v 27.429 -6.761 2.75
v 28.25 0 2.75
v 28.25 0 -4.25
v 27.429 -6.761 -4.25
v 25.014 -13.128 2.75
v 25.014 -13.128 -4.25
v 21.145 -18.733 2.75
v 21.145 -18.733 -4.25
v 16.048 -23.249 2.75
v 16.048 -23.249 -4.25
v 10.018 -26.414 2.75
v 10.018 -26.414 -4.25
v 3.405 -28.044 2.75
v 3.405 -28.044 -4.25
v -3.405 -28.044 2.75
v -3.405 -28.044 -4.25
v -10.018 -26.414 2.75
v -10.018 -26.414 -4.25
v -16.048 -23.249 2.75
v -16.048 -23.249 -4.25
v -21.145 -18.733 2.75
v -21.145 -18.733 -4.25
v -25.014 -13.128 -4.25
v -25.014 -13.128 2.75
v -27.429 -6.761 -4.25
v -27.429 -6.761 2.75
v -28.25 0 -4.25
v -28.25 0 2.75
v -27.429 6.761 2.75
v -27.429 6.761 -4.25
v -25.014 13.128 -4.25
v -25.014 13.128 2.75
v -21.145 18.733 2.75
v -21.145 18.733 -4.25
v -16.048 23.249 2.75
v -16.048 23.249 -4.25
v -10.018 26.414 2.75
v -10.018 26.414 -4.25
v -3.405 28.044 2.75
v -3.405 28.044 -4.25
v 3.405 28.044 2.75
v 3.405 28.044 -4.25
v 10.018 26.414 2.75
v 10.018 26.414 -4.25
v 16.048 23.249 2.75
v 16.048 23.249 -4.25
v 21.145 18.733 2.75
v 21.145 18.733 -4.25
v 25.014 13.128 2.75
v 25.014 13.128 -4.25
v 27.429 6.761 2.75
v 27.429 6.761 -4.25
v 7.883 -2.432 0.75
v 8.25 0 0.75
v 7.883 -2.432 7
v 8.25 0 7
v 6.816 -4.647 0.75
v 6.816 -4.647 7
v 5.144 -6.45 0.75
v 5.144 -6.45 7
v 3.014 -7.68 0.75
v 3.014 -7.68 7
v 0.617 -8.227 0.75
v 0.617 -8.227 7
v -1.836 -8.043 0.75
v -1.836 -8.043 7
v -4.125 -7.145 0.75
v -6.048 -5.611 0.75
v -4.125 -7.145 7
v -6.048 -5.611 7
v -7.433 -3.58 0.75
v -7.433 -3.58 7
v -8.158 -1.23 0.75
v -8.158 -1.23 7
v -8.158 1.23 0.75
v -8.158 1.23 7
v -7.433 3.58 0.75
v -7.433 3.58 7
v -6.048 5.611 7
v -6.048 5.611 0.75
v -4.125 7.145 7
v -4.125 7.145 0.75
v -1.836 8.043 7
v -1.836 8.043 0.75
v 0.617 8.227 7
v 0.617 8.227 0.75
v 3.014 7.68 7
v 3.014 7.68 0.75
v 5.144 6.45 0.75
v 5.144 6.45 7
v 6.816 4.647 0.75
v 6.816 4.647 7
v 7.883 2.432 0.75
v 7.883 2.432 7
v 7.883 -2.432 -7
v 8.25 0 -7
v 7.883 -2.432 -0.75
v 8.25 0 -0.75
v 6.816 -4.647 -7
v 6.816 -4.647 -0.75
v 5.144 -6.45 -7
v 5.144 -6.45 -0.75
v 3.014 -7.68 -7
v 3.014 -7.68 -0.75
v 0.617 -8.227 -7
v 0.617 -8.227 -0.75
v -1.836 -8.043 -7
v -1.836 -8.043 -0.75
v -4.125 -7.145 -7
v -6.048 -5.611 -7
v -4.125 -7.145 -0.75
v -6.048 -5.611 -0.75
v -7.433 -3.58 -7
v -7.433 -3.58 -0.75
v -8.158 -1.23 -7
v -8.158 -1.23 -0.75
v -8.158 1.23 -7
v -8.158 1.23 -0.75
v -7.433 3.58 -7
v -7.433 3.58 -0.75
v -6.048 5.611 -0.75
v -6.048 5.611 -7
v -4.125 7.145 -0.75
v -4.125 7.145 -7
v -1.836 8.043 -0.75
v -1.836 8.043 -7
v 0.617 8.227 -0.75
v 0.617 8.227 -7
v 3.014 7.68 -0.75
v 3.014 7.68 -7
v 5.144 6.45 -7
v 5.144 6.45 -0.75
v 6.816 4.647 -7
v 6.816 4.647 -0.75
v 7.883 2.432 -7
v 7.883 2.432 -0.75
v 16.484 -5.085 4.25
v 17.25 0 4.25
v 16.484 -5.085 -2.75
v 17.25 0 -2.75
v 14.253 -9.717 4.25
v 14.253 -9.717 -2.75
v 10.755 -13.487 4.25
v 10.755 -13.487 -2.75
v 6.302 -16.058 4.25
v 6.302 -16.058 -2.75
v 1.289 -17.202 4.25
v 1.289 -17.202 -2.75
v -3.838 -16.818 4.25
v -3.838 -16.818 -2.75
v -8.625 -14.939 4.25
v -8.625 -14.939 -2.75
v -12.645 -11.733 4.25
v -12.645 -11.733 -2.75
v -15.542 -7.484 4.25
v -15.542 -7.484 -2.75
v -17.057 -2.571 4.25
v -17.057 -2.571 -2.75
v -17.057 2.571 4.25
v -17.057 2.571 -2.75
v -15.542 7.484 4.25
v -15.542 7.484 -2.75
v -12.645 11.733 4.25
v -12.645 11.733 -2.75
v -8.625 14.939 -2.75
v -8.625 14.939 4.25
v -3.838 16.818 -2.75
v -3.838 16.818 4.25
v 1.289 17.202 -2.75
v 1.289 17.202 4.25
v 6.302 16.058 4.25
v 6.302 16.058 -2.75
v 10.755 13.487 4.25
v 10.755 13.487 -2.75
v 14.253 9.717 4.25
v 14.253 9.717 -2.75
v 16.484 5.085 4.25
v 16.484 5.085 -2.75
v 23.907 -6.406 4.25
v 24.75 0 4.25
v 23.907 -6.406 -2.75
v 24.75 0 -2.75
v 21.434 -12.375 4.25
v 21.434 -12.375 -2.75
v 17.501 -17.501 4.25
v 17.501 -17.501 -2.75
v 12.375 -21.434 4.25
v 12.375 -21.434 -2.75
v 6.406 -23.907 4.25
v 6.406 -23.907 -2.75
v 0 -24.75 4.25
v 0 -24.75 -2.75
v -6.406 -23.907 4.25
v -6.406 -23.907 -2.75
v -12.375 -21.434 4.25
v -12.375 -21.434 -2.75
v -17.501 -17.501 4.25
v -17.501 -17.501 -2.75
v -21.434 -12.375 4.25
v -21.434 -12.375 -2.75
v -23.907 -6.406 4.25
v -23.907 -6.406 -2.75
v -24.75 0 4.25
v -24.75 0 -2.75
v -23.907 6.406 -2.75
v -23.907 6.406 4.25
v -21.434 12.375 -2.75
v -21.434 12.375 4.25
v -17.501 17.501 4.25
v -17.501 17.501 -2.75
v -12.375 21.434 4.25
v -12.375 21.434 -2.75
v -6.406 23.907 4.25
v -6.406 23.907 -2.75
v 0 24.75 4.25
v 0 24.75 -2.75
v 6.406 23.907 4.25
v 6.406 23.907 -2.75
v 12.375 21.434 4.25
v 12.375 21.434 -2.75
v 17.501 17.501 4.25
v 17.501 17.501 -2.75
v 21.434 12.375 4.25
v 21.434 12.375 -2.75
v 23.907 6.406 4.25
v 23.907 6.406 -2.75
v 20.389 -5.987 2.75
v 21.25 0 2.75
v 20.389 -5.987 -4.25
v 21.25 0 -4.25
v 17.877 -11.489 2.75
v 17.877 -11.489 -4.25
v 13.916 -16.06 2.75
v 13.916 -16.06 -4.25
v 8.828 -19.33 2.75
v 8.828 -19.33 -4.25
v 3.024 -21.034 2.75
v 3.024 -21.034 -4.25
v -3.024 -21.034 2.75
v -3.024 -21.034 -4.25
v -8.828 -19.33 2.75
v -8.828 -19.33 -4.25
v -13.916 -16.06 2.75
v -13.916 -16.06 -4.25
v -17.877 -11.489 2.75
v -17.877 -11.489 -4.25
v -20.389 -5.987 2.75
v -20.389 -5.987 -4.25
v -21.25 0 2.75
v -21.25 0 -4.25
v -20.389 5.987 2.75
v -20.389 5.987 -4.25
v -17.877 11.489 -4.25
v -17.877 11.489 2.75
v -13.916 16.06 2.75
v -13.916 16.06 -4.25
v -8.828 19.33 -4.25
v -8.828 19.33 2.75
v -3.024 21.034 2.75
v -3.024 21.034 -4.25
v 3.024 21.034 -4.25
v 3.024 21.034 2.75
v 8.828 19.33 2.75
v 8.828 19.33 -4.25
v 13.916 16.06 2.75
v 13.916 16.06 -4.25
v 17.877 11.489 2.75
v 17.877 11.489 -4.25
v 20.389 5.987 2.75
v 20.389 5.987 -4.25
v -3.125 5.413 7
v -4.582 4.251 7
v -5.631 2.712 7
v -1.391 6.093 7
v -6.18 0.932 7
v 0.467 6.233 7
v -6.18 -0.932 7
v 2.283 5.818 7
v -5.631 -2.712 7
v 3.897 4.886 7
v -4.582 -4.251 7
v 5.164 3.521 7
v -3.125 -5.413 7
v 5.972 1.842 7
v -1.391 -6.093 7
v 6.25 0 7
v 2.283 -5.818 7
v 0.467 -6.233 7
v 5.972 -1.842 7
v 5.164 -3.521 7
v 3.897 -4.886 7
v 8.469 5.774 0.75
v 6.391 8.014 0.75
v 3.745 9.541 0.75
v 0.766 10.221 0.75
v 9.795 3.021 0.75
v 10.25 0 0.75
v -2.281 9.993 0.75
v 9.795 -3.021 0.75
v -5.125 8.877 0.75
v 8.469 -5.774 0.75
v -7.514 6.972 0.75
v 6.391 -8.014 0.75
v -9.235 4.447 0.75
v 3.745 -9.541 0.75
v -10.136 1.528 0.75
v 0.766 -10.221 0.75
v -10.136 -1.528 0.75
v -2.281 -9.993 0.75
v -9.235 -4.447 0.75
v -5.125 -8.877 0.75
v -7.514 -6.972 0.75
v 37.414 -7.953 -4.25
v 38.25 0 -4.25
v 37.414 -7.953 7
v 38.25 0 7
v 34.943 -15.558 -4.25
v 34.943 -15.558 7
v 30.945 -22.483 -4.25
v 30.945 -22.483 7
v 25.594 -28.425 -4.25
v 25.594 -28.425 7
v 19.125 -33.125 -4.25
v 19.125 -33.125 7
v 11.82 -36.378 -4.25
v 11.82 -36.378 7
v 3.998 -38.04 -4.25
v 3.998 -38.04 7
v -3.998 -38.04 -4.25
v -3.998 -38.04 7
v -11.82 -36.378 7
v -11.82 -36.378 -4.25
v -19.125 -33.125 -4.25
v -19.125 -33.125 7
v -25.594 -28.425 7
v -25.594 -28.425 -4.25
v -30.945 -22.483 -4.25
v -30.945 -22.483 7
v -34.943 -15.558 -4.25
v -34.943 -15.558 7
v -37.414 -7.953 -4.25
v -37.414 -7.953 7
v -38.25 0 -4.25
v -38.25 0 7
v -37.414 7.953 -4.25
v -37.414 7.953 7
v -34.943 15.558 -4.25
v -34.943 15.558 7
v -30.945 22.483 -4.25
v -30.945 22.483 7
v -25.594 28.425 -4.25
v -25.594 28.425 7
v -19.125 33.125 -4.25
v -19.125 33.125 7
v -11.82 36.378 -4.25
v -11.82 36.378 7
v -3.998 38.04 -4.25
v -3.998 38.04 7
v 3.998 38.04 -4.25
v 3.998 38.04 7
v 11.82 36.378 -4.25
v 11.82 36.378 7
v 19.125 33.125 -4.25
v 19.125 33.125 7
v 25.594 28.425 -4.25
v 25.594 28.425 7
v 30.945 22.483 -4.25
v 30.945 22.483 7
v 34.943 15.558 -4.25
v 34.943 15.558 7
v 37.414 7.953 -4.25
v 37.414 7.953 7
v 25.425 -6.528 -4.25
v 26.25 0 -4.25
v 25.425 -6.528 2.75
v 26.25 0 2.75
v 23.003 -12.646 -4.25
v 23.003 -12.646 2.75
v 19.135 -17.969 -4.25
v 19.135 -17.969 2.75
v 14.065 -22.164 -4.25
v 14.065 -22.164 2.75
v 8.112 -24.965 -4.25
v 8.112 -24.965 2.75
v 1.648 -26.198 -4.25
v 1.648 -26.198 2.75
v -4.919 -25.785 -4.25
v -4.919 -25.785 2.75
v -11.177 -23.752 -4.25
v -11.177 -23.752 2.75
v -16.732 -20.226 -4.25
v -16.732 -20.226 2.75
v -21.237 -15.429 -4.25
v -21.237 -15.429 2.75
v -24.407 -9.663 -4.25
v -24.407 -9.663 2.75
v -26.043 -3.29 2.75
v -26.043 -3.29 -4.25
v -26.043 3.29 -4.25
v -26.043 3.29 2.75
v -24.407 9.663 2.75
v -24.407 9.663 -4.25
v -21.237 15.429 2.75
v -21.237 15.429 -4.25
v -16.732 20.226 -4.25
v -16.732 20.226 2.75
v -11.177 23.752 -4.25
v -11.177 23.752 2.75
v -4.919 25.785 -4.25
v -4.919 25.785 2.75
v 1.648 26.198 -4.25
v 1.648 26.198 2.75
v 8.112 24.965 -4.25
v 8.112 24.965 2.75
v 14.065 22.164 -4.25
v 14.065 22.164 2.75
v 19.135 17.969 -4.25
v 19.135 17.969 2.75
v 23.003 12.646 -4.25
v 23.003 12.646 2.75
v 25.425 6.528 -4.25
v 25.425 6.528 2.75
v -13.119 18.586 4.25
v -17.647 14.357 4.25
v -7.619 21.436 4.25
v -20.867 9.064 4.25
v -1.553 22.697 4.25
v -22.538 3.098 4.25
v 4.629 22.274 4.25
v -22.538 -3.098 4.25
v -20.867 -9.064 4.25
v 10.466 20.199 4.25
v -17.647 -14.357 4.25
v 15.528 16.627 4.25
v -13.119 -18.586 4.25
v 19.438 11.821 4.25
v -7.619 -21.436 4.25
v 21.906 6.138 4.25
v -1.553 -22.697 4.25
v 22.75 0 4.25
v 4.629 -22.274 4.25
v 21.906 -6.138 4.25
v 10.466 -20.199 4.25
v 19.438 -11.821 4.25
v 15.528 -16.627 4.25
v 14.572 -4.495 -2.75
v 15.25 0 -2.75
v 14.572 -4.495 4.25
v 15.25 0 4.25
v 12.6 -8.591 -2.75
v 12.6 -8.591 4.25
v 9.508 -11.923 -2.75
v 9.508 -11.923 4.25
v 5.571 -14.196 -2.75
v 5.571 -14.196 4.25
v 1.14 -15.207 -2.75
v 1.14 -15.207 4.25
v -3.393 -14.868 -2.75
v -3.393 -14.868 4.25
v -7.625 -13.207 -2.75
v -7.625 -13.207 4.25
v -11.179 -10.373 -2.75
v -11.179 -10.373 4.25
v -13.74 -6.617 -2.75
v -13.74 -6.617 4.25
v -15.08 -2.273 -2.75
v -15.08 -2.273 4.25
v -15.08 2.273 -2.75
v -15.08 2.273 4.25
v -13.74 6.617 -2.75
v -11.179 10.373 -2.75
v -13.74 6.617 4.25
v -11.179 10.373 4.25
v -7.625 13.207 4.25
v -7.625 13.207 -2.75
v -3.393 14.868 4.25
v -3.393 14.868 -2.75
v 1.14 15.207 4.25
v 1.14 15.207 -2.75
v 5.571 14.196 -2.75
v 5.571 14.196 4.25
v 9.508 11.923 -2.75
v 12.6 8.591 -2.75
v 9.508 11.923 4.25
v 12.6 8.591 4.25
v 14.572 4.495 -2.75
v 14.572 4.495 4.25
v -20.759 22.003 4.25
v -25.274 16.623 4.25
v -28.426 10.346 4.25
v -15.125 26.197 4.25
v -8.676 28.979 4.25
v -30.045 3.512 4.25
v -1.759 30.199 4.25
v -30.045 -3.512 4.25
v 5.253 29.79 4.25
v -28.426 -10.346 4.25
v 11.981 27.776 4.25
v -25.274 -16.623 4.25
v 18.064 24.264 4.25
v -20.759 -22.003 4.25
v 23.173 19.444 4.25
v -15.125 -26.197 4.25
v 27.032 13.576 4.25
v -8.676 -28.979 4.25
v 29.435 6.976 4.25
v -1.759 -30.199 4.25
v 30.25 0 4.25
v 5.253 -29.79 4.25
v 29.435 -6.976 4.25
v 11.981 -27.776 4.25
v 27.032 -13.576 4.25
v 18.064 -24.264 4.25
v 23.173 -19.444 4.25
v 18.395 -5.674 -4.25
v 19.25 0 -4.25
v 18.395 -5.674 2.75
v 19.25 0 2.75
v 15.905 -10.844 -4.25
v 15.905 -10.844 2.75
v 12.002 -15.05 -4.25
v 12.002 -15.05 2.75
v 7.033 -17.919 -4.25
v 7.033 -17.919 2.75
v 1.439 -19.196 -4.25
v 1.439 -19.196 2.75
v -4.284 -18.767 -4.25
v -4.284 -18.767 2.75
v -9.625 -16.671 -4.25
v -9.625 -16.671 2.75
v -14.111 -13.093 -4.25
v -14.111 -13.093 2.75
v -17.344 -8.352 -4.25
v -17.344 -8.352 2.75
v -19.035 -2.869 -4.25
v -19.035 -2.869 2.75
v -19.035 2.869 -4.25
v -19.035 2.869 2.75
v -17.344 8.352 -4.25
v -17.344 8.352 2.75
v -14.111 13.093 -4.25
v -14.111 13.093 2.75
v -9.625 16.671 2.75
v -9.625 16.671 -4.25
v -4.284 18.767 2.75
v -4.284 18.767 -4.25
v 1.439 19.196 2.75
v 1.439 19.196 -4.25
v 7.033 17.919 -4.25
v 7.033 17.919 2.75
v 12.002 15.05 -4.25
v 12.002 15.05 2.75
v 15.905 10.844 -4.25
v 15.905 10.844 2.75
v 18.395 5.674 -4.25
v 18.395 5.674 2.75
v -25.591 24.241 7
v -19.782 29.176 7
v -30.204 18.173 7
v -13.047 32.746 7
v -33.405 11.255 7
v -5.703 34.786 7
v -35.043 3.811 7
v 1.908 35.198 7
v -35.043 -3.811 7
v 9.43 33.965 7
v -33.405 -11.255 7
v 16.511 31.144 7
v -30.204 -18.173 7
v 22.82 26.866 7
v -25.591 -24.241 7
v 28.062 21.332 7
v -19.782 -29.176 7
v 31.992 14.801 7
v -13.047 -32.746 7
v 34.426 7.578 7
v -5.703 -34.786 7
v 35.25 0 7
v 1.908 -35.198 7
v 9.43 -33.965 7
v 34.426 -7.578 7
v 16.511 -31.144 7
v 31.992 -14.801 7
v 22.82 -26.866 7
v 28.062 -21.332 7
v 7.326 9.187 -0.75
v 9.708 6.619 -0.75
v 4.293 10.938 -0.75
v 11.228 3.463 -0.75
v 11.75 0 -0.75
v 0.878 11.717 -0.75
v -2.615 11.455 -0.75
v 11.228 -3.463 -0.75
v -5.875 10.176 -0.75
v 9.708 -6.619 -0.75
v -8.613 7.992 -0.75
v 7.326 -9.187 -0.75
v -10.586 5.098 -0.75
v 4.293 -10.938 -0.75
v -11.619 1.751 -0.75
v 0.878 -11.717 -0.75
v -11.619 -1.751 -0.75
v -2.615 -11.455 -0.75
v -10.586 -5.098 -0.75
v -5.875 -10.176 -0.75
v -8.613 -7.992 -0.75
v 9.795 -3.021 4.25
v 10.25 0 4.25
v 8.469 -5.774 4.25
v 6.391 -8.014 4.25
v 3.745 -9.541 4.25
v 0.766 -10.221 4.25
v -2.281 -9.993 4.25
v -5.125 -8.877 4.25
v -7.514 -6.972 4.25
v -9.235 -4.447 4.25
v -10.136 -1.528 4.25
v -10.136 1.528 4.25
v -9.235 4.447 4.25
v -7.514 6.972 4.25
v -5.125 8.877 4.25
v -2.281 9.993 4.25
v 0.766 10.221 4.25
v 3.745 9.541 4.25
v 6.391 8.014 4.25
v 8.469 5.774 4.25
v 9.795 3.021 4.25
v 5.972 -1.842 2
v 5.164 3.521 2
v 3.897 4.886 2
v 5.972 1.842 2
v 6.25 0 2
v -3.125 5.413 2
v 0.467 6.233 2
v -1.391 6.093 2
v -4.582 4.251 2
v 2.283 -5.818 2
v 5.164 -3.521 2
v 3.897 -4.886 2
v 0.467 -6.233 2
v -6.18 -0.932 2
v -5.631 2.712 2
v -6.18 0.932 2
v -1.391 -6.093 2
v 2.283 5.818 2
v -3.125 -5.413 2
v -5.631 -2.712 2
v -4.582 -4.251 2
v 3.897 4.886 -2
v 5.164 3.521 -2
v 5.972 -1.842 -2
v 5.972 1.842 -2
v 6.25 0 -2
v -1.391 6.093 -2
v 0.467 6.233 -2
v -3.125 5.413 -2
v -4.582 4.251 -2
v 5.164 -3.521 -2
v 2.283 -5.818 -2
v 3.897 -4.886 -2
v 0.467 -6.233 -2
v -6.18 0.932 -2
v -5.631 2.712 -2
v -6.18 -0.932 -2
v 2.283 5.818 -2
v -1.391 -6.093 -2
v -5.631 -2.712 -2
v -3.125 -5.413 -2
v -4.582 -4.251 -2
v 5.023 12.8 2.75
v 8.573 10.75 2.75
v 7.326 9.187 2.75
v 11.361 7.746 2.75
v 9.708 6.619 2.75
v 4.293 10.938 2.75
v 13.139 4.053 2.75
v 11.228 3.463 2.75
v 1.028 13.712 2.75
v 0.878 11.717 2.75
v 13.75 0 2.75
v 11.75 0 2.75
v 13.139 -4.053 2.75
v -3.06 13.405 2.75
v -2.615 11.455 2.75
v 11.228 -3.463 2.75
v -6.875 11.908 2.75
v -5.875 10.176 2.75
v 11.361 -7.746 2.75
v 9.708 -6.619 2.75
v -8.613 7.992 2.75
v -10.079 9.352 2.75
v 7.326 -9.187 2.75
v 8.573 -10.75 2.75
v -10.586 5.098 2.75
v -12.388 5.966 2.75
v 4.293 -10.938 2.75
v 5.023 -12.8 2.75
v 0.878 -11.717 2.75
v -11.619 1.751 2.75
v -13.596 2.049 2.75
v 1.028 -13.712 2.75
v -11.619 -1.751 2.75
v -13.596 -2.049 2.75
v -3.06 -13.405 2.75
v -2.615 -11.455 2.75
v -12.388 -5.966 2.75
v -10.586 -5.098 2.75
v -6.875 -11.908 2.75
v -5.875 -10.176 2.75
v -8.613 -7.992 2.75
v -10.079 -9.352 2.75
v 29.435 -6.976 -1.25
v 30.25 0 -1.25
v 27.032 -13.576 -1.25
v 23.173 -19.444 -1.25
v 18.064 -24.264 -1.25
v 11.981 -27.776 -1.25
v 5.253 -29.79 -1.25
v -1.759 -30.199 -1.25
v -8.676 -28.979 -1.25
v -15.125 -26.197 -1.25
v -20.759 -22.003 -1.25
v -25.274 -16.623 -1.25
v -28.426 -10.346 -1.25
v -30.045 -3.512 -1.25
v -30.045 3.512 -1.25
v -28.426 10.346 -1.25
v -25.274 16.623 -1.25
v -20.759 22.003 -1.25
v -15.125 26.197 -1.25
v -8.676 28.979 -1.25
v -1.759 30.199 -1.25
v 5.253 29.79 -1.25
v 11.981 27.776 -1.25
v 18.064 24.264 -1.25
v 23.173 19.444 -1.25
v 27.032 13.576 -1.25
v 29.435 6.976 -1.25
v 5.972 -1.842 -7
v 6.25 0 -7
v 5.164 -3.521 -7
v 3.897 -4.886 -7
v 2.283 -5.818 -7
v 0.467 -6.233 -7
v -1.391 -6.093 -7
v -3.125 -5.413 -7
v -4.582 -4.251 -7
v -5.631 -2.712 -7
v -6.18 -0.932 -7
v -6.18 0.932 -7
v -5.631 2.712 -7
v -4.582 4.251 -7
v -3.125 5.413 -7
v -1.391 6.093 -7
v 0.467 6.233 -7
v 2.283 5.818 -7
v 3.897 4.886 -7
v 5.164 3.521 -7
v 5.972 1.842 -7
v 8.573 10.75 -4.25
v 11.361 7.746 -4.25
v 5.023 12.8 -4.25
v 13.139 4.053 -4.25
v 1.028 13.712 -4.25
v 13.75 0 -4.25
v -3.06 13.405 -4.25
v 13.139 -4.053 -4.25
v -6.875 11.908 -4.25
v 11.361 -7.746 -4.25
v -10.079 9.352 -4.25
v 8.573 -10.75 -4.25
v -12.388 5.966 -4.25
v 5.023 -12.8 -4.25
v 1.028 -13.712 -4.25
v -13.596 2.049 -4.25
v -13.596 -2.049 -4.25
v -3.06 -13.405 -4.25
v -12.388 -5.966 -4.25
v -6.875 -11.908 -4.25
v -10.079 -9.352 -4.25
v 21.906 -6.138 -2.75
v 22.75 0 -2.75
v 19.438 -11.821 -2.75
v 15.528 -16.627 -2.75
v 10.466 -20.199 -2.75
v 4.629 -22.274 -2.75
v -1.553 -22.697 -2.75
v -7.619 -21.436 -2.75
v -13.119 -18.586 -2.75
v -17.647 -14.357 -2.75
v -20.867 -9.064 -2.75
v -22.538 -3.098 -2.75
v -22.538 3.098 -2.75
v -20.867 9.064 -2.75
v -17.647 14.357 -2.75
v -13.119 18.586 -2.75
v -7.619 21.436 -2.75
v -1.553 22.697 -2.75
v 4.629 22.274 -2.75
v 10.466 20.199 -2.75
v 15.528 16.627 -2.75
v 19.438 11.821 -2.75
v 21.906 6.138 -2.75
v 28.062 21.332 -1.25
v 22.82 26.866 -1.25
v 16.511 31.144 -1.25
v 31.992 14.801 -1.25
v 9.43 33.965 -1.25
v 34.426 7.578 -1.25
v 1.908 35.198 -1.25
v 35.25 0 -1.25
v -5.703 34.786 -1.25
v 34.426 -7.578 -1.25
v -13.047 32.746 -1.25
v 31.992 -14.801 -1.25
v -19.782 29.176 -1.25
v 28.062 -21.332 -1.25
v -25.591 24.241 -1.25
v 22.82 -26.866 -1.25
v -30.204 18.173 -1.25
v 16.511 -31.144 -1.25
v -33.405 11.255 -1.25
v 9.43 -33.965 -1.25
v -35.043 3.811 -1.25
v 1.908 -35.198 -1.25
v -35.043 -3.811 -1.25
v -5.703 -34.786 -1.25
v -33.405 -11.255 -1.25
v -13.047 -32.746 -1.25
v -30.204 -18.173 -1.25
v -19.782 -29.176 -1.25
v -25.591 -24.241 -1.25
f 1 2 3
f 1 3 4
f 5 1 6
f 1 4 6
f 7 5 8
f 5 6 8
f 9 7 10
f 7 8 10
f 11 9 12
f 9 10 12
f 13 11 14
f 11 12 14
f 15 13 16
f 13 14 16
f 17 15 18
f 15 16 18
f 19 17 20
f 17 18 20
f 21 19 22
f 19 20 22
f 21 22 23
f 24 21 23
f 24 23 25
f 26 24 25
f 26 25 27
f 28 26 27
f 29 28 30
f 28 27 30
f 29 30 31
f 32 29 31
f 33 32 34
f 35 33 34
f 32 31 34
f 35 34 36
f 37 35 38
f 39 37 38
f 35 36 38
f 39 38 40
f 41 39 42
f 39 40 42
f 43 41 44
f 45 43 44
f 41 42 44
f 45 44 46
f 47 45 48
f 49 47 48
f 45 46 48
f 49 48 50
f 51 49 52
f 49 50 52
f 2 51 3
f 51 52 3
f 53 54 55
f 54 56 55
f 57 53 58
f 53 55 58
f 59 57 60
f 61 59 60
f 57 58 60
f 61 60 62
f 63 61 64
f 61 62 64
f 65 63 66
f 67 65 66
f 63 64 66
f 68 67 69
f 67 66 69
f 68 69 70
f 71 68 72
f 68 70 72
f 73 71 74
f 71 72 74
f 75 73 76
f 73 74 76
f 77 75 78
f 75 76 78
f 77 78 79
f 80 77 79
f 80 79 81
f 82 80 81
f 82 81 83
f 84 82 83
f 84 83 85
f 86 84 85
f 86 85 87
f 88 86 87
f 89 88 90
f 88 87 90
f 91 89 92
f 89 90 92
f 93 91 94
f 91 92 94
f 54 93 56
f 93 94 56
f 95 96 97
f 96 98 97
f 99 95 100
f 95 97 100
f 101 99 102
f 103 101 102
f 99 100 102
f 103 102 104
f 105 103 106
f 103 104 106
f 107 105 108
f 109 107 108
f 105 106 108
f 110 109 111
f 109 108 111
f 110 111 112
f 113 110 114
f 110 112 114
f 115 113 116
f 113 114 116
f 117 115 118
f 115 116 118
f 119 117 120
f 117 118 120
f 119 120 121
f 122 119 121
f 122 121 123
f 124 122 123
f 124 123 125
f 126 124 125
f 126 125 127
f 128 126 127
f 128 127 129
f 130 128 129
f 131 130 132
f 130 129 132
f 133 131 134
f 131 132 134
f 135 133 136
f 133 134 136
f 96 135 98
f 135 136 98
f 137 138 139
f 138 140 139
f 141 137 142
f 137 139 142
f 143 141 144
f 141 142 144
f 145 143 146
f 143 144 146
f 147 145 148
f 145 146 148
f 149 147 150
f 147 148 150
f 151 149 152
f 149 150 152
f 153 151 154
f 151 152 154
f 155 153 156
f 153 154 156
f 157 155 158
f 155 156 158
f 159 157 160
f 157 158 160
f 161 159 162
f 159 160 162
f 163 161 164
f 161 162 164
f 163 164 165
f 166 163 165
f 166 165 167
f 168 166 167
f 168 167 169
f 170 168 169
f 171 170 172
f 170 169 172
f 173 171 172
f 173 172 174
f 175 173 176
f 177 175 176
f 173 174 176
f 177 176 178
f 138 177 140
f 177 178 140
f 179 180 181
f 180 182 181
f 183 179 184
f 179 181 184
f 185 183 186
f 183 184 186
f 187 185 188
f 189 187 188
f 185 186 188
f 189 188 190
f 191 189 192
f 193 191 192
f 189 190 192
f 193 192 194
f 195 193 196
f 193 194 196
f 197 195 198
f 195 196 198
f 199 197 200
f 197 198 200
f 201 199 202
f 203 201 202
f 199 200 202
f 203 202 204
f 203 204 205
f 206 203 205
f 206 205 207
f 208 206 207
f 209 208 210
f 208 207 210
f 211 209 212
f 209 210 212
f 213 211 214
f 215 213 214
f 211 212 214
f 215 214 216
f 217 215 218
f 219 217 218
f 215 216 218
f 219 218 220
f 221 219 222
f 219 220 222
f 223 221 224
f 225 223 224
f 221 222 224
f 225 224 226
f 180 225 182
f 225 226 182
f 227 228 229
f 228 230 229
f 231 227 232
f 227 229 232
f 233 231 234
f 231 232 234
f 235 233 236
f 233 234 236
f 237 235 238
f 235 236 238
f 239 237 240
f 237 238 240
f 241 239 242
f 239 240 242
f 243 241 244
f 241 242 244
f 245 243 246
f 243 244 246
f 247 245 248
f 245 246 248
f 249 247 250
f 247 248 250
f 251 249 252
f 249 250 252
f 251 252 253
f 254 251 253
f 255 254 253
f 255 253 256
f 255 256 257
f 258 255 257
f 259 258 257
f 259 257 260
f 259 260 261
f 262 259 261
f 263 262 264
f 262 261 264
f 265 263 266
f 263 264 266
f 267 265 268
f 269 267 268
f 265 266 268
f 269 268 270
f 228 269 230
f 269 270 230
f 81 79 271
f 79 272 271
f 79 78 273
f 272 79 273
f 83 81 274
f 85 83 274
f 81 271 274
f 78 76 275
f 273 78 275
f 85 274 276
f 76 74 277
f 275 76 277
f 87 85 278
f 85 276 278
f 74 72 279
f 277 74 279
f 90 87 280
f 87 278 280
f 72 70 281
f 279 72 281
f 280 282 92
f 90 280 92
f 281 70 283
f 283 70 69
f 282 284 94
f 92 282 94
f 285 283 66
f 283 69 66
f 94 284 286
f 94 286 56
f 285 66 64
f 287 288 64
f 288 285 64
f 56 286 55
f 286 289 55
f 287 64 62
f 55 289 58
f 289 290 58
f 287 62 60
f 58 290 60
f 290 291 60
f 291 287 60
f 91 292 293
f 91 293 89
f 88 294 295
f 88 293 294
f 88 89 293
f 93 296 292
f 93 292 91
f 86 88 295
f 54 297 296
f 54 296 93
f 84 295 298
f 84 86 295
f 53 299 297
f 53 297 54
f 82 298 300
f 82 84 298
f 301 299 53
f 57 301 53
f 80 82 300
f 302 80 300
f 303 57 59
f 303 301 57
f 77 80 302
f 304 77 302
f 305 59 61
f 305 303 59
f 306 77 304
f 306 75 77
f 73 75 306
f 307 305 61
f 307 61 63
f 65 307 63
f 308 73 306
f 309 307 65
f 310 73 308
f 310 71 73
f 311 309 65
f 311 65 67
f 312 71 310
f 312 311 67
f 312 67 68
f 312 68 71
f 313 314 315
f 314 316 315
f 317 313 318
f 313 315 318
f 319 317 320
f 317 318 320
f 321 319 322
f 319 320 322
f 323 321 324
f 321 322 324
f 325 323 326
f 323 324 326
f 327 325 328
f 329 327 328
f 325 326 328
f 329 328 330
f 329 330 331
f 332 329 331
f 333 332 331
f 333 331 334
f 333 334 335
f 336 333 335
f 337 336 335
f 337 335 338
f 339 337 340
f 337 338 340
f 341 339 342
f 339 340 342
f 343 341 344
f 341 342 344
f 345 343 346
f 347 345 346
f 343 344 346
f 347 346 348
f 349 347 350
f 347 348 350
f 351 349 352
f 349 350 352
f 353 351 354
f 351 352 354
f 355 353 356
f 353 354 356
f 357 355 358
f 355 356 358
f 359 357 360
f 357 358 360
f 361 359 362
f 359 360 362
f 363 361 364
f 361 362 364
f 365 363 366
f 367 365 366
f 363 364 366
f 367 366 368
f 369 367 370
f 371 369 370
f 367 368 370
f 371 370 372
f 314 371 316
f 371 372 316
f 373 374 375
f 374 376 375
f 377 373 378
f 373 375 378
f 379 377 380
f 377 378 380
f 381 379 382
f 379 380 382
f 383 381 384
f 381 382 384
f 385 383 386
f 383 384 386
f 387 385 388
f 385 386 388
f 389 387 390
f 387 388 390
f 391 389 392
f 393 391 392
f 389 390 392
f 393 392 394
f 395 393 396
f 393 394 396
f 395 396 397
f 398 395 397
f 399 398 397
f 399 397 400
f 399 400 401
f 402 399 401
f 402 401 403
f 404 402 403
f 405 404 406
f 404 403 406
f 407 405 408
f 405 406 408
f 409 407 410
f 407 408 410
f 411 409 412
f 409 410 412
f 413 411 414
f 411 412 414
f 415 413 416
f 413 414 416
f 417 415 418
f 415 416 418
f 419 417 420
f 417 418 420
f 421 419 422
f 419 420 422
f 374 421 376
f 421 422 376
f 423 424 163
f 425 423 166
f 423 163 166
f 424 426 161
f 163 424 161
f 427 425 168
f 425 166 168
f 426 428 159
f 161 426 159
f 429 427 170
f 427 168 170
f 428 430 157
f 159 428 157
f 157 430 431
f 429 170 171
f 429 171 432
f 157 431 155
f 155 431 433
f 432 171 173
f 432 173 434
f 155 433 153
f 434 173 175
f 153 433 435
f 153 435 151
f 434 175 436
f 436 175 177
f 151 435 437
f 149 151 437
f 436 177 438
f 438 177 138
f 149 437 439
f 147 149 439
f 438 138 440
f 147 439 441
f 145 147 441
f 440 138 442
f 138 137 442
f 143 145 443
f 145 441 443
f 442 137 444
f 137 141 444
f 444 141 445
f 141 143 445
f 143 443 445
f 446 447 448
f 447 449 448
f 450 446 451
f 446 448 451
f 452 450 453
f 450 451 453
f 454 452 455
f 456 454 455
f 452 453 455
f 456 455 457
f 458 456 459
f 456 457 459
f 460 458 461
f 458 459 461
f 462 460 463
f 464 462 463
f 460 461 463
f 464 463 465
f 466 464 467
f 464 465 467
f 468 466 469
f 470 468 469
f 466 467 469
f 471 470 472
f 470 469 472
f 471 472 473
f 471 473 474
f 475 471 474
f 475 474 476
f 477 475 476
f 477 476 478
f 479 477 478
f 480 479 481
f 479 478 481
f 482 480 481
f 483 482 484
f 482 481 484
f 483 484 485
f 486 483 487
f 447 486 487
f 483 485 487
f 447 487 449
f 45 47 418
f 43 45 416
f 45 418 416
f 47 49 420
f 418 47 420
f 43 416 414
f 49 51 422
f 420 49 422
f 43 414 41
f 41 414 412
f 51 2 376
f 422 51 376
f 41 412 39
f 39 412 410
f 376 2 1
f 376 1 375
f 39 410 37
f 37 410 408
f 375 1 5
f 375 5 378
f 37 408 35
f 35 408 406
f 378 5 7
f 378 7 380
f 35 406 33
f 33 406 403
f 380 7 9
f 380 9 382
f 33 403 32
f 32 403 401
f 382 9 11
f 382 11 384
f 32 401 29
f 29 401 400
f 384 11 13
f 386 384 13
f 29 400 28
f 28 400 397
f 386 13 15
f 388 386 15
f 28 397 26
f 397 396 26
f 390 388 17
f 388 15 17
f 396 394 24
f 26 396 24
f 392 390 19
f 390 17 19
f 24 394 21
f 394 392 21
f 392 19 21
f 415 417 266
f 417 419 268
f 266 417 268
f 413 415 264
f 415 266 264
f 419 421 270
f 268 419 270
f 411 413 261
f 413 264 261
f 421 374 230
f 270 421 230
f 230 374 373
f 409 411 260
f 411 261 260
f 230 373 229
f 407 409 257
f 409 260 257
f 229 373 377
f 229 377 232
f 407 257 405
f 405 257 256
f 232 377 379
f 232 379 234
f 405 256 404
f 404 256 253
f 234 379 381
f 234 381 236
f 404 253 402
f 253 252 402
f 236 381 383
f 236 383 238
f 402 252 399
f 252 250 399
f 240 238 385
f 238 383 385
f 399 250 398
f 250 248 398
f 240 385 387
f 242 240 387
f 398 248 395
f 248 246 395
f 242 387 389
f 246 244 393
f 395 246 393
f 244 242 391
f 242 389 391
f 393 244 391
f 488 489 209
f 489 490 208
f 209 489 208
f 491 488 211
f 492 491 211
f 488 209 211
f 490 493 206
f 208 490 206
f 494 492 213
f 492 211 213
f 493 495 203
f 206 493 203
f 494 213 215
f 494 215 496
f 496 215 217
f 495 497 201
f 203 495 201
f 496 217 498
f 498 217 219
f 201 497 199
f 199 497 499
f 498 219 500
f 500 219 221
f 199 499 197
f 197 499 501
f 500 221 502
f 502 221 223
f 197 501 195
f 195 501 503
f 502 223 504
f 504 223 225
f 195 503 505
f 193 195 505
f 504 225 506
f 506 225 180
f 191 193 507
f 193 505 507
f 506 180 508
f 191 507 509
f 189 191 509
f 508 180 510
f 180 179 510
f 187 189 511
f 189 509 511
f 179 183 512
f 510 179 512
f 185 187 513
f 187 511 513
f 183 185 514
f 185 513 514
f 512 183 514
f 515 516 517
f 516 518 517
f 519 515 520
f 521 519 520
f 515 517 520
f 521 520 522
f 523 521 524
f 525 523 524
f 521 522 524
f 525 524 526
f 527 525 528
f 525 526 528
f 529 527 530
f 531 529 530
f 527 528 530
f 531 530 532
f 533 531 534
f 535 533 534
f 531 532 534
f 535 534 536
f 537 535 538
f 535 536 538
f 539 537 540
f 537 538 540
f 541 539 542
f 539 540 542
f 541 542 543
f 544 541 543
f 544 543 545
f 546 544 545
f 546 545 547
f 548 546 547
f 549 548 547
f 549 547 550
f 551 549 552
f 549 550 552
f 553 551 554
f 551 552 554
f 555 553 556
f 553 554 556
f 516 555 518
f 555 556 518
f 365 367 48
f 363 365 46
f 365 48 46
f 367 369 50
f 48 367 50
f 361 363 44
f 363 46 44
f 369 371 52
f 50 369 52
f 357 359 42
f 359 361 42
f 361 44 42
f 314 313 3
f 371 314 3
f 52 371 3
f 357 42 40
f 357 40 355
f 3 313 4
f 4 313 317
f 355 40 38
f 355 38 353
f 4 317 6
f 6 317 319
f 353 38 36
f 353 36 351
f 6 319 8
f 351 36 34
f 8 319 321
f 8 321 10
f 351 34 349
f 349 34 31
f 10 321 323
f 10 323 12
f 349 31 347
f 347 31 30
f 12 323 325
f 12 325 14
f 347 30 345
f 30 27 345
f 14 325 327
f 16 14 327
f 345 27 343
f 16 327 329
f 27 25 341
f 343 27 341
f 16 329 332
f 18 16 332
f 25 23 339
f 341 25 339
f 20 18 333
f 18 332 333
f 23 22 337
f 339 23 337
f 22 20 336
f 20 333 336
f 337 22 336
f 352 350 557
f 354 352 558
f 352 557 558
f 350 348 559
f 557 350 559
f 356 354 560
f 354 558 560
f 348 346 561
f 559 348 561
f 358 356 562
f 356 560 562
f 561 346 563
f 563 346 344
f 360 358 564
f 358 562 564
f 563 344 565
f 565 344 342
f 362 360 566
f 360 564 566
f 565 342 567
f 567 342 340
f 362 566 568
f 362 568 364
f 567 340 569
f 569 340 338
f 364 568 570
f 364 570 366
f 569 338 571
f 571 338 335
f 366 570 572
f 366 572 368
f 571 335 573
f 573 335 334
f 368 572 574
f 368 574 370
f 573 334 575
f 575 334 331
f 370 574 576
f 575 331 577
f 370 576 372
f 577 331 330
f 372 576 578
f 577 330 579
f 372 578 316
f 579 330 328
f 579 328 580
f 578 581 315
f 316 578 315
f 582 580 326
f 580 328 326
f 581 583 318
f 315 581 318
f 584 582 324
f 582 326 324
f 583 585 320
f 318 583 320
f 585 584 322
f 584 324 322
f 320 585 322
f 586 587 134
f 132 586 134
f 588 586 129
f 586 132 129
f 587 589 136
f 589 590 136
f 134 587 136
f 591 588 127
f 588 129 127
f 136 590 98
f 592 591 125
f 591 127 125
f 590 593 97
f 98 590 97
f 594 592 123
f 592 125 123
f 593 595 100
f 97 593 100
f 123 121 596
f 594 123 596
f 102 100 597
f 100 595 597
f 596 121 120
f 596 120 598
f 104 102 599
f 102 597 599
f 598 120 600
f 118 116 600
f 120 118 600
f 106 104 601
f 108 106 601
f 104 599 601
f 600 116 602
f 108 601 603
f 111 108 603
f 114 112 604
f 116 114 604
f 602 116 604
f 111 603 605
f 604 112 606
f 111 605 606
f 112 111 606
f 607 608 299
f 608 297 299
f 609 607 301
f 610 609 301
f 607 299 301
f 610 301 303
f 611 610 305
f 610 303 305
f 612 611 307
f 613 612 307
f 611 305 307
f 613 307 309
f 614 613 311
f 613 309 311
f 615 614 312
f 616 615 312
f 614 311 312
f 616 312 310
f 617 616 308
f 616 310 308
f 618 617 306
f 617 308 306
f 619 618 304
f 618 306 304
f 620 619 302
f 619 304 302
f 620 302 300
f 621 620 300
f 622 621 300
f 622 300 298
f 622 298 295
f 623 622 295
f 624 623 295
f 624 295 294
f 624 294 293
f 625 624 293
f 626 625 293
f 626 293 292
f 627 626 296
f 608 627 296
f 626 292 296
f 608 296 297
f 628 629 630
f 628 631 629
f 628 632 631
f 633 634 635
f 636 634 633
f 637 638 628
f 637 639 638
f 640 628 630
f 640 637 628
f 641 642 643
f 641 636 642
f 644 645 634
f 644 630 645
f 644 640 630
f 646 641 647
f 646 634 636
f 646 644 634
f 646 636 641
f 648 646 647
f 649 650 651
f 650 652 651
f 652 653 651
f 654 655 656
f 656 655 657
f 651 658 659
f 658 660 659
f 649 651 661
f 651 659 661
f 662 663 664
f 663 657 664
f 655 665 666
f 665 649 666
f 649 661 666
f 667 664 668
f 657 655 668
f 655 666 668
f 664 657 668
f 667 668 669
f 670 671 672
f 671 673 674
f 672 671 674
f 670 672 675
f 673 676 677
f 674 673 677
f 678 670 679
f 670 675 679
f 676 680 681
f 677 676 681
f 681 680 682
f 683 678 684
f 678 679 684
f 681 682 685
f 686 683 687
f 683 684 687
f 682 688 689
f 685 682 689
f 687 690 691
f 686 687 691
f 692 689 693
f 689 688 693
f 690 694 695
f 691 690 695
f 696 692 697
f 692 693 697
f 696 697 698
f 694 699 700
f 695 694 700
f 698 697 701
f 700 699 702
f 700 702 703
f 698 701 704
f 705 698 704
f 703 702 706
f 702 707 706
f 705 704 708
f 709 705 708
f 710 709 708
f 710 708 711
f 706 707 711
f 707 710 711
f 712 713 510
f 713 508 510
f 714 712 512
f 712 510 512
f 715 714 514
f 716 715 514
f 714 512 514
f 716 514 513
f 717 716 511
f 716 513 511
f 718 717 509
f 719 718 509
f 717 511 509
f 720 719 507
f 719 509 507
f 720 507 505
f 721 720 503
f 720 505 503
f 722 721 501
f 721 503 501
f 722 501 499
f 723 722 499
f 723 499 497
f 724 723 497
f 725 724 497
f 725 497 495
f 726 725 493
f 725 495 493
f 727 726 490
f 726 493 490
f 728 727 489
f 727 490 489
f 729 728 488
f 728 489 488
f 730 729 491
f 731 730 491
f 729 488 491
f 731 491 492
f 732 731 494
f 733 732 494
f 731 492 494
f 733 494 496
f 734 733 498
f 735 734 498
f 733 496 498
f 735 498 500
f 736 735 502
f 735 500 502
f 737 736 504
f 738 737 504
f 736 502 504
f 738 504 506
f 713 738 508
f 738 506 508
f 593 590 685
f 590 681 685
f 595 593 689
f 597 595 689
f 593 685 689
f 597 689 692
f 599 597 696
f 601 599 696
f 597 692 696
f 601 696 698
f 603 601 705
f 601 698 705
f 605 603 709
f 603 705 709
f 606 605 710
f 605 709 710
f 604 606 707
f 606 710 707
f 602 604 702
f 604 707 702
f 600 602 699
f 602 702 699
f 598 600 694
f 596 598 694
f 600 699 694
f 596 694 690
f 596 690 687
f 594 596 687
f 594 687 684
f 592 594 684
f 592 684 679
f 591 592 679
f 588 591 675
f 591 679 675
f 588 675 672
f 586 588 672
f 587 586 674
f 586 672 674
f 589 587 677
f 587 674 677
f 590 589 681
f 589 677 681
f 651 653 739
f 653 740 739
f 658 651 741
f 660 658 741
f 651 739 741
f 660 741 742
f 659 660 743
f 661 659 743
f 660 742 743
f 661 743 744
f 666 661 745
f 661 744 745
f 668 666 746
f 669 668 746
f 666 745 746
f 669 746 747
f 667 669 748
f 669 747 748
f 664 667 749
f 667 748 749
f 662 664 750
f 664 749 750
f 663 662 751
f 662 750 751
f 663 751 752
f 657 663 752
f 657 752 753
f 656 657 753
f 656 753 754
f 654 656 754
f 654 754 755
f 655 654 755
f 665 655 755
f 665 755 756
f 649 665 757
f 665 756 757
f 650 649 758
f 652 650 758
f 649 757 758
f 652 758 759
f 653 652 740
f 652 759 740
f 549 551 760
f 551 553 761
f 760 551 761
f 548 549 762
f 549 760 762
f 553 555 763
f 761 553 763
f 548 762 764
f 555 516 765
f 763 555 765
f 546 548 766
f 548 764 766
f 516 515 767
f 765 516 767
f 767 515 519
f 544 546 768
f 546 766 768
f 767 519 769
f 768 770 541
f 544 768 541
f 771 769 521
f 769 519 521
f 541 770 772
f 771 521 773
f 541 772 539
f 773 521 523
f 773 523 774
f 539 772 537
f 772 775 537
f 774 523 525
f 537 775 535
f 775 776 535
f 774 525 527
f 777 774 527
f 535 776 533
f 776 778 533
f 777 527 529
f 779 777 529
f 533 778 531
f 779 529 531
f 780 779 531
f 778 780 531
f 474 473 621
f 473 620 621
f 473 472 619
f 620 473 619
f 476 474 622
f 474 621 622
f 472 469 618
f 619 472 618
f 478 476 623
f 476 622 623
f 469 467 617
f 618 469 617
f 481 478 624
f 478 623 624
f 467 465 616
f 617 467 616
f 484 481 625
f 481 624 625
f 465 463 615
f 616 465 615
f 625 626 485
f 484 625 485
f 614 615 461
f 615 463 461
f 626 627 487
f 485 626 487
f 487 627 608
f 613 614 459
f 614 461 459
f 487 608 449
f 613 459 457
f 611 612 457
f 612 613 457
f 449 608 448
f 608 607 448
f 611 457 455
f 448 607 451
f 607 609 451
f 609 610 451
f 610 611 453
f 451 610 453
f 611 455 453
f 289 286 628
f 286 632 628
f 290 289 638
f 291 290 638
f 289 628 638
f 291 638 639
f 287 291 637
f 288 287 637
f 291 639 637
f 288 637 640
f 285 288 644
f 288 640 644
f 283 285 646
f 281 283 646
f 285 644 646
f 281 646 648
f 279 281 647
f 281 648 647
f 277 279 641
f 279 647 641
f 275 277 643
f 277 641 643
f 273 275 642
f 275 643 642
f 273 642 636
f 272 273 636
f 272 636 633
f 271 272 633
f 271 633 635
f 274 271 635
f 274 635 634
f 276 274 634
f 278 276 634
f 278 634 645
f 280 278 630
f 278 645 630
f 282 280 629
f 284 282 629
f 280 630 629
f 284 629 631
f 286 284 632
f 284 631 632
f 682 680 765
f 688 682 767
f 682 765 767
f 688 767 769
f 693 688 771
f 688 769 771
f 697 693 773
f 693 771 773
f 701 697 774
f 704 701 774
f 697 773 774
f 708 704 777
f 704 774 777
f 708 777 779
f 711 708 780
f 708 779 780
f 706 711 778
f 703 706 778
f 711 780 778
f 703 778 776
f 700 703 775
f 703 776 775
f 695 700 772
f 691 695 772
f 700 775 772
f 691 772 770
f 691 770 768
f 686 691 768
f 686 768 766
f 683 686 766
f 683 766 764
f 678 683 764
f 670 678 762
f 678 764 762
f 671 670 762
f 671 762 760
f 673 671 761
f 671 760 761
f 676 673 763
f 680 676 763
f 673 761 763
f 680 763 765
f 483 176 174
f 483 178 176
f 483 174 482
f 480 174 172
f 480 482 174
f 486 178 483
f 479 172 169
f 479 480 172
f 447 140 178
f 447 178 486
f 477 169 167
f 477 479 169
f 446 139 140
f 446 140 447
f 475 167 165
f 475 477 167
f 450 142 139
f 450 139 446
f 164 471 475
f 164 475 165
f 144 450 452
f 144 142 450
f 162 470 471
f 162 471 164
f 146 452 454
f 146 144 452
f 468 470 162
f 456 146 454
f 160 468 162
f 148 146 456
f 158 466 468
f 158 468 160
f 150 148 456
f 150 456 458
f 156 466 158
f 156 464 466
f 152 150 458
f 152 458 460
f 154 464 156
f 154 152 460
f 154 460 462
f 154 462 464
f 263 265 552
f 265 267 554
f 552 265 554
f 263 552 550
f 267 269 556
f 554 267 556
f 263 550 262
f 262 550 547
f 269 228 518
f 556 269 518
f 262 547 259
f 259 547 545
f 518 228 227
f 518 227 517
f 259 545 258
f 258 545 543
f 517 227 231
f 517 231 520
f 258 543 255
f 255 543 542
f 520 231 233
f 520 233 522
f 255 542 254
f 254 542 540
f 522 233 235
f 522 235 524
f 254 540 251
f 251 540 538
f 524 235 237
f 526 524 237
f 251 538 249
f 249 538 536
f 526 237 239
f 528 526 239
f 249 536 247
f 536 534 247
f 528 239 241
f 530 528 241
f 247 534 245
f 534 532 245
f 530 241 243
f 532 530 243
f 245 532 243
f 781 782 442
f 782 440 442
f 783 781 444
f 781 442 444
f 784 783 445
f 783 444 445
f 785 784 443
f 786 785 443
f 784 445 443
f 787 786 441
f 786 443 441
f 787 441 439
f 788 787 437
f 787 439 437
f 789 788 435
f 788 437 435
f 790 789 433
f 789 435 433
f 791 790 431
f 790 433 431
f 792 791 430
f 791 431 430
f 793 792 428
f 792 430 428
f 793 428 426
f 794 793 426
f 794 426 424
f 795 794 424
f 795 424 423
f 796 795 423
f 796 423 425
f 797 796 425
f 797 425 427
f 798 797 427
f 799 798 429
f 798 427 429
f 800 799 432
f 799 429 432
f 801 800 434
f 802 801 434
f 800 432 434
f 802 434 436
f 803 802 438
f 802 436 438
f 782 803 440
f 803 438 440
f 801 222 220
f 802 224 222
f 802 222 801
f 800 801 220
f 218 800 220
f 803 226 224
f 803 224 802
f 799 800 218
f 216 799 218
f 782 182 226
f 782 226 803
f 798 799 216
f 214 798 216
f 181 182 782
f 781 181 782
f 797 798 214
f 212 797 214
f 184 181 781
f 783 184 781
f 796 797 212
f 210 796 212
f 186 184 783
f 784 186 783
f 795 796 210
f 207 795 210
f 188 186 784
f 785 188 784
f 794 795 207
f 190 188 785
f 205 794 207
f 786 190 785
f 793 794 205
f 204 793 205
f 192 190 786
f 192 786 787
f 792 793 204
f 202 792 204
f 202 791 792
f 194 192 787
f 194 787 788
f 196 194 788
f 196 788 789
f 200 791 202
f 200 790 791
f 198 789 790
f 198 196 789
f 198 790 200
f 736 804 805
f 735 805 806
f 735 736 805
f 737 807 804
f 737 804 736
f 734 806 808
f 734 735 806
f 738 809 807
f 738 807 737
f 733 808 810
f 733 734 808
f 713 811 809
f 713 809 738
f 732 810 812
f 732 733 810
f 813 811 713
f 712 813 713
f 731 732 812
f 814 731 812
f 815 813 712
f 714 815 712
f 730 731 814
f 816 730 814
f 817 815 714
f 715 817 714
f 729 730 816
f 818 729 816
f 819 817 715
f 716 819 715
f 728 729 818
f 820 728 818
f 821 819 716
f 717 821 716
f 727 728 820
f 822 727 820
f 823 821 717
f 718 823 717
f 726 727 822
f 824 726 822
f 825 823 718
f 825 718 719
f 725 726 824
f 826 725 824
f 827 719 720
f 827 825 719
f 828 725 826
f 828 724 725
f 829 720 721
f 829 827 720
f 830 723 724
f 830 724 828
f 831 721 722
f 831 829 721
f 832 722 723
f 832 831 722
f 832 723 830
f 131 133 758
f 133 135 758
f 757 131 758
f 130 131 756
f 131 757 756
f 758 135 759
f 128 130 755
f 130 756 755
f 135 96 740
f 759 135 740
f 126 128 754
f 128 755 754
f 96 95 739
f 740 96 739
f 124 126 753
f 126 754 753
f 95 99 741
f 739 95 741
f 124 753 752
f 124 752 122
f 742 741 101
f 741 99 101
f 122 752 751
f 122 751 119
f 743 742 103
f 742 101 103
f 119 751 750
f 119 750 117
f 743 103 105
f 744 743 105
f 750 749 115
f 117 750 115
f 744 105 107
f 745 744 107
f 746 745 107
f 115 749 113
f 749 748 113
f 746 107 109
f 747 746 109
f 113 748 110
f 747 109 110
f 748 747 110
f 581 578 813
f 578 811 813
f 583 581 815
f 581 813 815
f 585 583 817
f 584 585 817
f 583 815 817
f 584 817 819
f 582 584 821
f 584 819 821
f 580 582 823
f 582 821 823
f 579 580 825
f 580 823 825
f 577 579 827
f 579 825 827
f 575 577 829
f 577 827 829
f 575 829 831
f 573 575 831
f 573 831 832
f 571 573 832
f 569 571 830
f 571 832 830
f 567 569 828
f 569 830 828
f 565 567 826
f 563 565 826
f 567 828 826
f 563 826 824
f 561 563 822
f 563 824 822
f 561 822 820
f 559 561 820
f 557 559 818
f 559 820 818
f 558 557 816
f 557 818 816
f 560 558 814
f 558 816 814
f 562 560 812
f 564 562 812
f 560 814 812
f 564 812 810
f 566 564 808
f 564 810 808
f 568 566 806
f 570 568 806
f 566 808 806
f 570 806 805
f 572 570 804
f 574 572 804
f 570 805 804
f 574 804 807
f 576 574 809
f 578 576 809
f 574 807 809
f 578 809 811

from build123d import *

# Parameters (mm, degrees)
F0_W   = 6.25
F0_H   = 2
F0_W_2 = 2
F0_H_2 = 0.75
F0_H_3 = 1.5
F0_W_3 = 5
F0_H_4 = 3


with BuildPart() as f2:
    # F0 (on Front) → F2 (revolve)
    with BuildSketch(Plane.XZ):
        with Locations((3.125, 1)):
            Rectangle(F0_W, F0_H)
        with Locations((3.125, -1)):
            Rectangle(F0_W, F0_H)
        Polygon((8.25, 0), (6.25, 0), (6.25, -2), (6.25, -7), (8.25, -7), (8.25, -0.75), align=None)
        Polygon((6.25, 2), (6.25, 0), (8.25, 0), (8.25, 0.75), (8.25, 7), (6.25, 7), align=None)
        with Locations((9.25, -0.375)):
            Rectangle(F0_W_2, F0_H_2)
        with Locations((9.25, 0.375)):
            Rectangle(F0_W_2, F0_H_2)
        Polygon((10.25, 0.75), (10.25, 0), (10.25, -0.75), (11.75, -0.75), (11.75, 2.75), (11.75, 4.25), (10.25, 4.25), align=None)
        with Locations((12.75, 3.5)):
            Rectangle(F0_W_2, F0_H_3)
        Polygon((15.25, 4.25), (13.75, 4.25), (13.75, 2.75), (13.75, -4.25), (15.25, -4.25), (15.25, -2.75), align=None)
        with Locations((16.25, -3.5)):
            Rectangle(F0_W_2, F0_H_3)
        Polygon((17.25, 4.25), (17.25, -2.75), (17.25, -4.25), (19.25, -4.25), (19.25, 2.75), (19.25, 4.25), align=None)
        with Locations((20.25, 3.5)):
            Rectangle(F0_W_2, F0_H_3)
        Polygon((22.75, 4.25), (21.25, 4.25), (21.25, 2.75), (21.25, -4.25), (22.75, -4.25), (22.75, -2.75), align=None)
        with Locations((23.75, -3.5)):
            Rectangle(F0_W_2, F0_H_3)
        Polygon((24.75, 4.25), (24.75, -2.75), (24.75, -4.25), (26.25, -4.25), (26.25, 2.75), (26.25, 4.25), align=None)
        with Locations((27.25, 3.5)):
            Rectangle(F0_W_2, F0_H_3)
        Polygon((30.25, 4.25), (28.25, 4.25), (28.25, 2.75), (28.25, -4.25), (30.25, -4.25), (30.25, -1.25), align=None)
        with Locations((32.75, -2.75)):
            Rectangle(F0_W_3, F0_H_4)
        Polygon((35.25, 7), (35.25, -1.25), (35.25, -4.25), (38.25, -4.25), (38.25, 7), align=None)
    revolve(axis=Axis((0, 0, -2.002694), (0, 0, -1)))


solid = f2.part
